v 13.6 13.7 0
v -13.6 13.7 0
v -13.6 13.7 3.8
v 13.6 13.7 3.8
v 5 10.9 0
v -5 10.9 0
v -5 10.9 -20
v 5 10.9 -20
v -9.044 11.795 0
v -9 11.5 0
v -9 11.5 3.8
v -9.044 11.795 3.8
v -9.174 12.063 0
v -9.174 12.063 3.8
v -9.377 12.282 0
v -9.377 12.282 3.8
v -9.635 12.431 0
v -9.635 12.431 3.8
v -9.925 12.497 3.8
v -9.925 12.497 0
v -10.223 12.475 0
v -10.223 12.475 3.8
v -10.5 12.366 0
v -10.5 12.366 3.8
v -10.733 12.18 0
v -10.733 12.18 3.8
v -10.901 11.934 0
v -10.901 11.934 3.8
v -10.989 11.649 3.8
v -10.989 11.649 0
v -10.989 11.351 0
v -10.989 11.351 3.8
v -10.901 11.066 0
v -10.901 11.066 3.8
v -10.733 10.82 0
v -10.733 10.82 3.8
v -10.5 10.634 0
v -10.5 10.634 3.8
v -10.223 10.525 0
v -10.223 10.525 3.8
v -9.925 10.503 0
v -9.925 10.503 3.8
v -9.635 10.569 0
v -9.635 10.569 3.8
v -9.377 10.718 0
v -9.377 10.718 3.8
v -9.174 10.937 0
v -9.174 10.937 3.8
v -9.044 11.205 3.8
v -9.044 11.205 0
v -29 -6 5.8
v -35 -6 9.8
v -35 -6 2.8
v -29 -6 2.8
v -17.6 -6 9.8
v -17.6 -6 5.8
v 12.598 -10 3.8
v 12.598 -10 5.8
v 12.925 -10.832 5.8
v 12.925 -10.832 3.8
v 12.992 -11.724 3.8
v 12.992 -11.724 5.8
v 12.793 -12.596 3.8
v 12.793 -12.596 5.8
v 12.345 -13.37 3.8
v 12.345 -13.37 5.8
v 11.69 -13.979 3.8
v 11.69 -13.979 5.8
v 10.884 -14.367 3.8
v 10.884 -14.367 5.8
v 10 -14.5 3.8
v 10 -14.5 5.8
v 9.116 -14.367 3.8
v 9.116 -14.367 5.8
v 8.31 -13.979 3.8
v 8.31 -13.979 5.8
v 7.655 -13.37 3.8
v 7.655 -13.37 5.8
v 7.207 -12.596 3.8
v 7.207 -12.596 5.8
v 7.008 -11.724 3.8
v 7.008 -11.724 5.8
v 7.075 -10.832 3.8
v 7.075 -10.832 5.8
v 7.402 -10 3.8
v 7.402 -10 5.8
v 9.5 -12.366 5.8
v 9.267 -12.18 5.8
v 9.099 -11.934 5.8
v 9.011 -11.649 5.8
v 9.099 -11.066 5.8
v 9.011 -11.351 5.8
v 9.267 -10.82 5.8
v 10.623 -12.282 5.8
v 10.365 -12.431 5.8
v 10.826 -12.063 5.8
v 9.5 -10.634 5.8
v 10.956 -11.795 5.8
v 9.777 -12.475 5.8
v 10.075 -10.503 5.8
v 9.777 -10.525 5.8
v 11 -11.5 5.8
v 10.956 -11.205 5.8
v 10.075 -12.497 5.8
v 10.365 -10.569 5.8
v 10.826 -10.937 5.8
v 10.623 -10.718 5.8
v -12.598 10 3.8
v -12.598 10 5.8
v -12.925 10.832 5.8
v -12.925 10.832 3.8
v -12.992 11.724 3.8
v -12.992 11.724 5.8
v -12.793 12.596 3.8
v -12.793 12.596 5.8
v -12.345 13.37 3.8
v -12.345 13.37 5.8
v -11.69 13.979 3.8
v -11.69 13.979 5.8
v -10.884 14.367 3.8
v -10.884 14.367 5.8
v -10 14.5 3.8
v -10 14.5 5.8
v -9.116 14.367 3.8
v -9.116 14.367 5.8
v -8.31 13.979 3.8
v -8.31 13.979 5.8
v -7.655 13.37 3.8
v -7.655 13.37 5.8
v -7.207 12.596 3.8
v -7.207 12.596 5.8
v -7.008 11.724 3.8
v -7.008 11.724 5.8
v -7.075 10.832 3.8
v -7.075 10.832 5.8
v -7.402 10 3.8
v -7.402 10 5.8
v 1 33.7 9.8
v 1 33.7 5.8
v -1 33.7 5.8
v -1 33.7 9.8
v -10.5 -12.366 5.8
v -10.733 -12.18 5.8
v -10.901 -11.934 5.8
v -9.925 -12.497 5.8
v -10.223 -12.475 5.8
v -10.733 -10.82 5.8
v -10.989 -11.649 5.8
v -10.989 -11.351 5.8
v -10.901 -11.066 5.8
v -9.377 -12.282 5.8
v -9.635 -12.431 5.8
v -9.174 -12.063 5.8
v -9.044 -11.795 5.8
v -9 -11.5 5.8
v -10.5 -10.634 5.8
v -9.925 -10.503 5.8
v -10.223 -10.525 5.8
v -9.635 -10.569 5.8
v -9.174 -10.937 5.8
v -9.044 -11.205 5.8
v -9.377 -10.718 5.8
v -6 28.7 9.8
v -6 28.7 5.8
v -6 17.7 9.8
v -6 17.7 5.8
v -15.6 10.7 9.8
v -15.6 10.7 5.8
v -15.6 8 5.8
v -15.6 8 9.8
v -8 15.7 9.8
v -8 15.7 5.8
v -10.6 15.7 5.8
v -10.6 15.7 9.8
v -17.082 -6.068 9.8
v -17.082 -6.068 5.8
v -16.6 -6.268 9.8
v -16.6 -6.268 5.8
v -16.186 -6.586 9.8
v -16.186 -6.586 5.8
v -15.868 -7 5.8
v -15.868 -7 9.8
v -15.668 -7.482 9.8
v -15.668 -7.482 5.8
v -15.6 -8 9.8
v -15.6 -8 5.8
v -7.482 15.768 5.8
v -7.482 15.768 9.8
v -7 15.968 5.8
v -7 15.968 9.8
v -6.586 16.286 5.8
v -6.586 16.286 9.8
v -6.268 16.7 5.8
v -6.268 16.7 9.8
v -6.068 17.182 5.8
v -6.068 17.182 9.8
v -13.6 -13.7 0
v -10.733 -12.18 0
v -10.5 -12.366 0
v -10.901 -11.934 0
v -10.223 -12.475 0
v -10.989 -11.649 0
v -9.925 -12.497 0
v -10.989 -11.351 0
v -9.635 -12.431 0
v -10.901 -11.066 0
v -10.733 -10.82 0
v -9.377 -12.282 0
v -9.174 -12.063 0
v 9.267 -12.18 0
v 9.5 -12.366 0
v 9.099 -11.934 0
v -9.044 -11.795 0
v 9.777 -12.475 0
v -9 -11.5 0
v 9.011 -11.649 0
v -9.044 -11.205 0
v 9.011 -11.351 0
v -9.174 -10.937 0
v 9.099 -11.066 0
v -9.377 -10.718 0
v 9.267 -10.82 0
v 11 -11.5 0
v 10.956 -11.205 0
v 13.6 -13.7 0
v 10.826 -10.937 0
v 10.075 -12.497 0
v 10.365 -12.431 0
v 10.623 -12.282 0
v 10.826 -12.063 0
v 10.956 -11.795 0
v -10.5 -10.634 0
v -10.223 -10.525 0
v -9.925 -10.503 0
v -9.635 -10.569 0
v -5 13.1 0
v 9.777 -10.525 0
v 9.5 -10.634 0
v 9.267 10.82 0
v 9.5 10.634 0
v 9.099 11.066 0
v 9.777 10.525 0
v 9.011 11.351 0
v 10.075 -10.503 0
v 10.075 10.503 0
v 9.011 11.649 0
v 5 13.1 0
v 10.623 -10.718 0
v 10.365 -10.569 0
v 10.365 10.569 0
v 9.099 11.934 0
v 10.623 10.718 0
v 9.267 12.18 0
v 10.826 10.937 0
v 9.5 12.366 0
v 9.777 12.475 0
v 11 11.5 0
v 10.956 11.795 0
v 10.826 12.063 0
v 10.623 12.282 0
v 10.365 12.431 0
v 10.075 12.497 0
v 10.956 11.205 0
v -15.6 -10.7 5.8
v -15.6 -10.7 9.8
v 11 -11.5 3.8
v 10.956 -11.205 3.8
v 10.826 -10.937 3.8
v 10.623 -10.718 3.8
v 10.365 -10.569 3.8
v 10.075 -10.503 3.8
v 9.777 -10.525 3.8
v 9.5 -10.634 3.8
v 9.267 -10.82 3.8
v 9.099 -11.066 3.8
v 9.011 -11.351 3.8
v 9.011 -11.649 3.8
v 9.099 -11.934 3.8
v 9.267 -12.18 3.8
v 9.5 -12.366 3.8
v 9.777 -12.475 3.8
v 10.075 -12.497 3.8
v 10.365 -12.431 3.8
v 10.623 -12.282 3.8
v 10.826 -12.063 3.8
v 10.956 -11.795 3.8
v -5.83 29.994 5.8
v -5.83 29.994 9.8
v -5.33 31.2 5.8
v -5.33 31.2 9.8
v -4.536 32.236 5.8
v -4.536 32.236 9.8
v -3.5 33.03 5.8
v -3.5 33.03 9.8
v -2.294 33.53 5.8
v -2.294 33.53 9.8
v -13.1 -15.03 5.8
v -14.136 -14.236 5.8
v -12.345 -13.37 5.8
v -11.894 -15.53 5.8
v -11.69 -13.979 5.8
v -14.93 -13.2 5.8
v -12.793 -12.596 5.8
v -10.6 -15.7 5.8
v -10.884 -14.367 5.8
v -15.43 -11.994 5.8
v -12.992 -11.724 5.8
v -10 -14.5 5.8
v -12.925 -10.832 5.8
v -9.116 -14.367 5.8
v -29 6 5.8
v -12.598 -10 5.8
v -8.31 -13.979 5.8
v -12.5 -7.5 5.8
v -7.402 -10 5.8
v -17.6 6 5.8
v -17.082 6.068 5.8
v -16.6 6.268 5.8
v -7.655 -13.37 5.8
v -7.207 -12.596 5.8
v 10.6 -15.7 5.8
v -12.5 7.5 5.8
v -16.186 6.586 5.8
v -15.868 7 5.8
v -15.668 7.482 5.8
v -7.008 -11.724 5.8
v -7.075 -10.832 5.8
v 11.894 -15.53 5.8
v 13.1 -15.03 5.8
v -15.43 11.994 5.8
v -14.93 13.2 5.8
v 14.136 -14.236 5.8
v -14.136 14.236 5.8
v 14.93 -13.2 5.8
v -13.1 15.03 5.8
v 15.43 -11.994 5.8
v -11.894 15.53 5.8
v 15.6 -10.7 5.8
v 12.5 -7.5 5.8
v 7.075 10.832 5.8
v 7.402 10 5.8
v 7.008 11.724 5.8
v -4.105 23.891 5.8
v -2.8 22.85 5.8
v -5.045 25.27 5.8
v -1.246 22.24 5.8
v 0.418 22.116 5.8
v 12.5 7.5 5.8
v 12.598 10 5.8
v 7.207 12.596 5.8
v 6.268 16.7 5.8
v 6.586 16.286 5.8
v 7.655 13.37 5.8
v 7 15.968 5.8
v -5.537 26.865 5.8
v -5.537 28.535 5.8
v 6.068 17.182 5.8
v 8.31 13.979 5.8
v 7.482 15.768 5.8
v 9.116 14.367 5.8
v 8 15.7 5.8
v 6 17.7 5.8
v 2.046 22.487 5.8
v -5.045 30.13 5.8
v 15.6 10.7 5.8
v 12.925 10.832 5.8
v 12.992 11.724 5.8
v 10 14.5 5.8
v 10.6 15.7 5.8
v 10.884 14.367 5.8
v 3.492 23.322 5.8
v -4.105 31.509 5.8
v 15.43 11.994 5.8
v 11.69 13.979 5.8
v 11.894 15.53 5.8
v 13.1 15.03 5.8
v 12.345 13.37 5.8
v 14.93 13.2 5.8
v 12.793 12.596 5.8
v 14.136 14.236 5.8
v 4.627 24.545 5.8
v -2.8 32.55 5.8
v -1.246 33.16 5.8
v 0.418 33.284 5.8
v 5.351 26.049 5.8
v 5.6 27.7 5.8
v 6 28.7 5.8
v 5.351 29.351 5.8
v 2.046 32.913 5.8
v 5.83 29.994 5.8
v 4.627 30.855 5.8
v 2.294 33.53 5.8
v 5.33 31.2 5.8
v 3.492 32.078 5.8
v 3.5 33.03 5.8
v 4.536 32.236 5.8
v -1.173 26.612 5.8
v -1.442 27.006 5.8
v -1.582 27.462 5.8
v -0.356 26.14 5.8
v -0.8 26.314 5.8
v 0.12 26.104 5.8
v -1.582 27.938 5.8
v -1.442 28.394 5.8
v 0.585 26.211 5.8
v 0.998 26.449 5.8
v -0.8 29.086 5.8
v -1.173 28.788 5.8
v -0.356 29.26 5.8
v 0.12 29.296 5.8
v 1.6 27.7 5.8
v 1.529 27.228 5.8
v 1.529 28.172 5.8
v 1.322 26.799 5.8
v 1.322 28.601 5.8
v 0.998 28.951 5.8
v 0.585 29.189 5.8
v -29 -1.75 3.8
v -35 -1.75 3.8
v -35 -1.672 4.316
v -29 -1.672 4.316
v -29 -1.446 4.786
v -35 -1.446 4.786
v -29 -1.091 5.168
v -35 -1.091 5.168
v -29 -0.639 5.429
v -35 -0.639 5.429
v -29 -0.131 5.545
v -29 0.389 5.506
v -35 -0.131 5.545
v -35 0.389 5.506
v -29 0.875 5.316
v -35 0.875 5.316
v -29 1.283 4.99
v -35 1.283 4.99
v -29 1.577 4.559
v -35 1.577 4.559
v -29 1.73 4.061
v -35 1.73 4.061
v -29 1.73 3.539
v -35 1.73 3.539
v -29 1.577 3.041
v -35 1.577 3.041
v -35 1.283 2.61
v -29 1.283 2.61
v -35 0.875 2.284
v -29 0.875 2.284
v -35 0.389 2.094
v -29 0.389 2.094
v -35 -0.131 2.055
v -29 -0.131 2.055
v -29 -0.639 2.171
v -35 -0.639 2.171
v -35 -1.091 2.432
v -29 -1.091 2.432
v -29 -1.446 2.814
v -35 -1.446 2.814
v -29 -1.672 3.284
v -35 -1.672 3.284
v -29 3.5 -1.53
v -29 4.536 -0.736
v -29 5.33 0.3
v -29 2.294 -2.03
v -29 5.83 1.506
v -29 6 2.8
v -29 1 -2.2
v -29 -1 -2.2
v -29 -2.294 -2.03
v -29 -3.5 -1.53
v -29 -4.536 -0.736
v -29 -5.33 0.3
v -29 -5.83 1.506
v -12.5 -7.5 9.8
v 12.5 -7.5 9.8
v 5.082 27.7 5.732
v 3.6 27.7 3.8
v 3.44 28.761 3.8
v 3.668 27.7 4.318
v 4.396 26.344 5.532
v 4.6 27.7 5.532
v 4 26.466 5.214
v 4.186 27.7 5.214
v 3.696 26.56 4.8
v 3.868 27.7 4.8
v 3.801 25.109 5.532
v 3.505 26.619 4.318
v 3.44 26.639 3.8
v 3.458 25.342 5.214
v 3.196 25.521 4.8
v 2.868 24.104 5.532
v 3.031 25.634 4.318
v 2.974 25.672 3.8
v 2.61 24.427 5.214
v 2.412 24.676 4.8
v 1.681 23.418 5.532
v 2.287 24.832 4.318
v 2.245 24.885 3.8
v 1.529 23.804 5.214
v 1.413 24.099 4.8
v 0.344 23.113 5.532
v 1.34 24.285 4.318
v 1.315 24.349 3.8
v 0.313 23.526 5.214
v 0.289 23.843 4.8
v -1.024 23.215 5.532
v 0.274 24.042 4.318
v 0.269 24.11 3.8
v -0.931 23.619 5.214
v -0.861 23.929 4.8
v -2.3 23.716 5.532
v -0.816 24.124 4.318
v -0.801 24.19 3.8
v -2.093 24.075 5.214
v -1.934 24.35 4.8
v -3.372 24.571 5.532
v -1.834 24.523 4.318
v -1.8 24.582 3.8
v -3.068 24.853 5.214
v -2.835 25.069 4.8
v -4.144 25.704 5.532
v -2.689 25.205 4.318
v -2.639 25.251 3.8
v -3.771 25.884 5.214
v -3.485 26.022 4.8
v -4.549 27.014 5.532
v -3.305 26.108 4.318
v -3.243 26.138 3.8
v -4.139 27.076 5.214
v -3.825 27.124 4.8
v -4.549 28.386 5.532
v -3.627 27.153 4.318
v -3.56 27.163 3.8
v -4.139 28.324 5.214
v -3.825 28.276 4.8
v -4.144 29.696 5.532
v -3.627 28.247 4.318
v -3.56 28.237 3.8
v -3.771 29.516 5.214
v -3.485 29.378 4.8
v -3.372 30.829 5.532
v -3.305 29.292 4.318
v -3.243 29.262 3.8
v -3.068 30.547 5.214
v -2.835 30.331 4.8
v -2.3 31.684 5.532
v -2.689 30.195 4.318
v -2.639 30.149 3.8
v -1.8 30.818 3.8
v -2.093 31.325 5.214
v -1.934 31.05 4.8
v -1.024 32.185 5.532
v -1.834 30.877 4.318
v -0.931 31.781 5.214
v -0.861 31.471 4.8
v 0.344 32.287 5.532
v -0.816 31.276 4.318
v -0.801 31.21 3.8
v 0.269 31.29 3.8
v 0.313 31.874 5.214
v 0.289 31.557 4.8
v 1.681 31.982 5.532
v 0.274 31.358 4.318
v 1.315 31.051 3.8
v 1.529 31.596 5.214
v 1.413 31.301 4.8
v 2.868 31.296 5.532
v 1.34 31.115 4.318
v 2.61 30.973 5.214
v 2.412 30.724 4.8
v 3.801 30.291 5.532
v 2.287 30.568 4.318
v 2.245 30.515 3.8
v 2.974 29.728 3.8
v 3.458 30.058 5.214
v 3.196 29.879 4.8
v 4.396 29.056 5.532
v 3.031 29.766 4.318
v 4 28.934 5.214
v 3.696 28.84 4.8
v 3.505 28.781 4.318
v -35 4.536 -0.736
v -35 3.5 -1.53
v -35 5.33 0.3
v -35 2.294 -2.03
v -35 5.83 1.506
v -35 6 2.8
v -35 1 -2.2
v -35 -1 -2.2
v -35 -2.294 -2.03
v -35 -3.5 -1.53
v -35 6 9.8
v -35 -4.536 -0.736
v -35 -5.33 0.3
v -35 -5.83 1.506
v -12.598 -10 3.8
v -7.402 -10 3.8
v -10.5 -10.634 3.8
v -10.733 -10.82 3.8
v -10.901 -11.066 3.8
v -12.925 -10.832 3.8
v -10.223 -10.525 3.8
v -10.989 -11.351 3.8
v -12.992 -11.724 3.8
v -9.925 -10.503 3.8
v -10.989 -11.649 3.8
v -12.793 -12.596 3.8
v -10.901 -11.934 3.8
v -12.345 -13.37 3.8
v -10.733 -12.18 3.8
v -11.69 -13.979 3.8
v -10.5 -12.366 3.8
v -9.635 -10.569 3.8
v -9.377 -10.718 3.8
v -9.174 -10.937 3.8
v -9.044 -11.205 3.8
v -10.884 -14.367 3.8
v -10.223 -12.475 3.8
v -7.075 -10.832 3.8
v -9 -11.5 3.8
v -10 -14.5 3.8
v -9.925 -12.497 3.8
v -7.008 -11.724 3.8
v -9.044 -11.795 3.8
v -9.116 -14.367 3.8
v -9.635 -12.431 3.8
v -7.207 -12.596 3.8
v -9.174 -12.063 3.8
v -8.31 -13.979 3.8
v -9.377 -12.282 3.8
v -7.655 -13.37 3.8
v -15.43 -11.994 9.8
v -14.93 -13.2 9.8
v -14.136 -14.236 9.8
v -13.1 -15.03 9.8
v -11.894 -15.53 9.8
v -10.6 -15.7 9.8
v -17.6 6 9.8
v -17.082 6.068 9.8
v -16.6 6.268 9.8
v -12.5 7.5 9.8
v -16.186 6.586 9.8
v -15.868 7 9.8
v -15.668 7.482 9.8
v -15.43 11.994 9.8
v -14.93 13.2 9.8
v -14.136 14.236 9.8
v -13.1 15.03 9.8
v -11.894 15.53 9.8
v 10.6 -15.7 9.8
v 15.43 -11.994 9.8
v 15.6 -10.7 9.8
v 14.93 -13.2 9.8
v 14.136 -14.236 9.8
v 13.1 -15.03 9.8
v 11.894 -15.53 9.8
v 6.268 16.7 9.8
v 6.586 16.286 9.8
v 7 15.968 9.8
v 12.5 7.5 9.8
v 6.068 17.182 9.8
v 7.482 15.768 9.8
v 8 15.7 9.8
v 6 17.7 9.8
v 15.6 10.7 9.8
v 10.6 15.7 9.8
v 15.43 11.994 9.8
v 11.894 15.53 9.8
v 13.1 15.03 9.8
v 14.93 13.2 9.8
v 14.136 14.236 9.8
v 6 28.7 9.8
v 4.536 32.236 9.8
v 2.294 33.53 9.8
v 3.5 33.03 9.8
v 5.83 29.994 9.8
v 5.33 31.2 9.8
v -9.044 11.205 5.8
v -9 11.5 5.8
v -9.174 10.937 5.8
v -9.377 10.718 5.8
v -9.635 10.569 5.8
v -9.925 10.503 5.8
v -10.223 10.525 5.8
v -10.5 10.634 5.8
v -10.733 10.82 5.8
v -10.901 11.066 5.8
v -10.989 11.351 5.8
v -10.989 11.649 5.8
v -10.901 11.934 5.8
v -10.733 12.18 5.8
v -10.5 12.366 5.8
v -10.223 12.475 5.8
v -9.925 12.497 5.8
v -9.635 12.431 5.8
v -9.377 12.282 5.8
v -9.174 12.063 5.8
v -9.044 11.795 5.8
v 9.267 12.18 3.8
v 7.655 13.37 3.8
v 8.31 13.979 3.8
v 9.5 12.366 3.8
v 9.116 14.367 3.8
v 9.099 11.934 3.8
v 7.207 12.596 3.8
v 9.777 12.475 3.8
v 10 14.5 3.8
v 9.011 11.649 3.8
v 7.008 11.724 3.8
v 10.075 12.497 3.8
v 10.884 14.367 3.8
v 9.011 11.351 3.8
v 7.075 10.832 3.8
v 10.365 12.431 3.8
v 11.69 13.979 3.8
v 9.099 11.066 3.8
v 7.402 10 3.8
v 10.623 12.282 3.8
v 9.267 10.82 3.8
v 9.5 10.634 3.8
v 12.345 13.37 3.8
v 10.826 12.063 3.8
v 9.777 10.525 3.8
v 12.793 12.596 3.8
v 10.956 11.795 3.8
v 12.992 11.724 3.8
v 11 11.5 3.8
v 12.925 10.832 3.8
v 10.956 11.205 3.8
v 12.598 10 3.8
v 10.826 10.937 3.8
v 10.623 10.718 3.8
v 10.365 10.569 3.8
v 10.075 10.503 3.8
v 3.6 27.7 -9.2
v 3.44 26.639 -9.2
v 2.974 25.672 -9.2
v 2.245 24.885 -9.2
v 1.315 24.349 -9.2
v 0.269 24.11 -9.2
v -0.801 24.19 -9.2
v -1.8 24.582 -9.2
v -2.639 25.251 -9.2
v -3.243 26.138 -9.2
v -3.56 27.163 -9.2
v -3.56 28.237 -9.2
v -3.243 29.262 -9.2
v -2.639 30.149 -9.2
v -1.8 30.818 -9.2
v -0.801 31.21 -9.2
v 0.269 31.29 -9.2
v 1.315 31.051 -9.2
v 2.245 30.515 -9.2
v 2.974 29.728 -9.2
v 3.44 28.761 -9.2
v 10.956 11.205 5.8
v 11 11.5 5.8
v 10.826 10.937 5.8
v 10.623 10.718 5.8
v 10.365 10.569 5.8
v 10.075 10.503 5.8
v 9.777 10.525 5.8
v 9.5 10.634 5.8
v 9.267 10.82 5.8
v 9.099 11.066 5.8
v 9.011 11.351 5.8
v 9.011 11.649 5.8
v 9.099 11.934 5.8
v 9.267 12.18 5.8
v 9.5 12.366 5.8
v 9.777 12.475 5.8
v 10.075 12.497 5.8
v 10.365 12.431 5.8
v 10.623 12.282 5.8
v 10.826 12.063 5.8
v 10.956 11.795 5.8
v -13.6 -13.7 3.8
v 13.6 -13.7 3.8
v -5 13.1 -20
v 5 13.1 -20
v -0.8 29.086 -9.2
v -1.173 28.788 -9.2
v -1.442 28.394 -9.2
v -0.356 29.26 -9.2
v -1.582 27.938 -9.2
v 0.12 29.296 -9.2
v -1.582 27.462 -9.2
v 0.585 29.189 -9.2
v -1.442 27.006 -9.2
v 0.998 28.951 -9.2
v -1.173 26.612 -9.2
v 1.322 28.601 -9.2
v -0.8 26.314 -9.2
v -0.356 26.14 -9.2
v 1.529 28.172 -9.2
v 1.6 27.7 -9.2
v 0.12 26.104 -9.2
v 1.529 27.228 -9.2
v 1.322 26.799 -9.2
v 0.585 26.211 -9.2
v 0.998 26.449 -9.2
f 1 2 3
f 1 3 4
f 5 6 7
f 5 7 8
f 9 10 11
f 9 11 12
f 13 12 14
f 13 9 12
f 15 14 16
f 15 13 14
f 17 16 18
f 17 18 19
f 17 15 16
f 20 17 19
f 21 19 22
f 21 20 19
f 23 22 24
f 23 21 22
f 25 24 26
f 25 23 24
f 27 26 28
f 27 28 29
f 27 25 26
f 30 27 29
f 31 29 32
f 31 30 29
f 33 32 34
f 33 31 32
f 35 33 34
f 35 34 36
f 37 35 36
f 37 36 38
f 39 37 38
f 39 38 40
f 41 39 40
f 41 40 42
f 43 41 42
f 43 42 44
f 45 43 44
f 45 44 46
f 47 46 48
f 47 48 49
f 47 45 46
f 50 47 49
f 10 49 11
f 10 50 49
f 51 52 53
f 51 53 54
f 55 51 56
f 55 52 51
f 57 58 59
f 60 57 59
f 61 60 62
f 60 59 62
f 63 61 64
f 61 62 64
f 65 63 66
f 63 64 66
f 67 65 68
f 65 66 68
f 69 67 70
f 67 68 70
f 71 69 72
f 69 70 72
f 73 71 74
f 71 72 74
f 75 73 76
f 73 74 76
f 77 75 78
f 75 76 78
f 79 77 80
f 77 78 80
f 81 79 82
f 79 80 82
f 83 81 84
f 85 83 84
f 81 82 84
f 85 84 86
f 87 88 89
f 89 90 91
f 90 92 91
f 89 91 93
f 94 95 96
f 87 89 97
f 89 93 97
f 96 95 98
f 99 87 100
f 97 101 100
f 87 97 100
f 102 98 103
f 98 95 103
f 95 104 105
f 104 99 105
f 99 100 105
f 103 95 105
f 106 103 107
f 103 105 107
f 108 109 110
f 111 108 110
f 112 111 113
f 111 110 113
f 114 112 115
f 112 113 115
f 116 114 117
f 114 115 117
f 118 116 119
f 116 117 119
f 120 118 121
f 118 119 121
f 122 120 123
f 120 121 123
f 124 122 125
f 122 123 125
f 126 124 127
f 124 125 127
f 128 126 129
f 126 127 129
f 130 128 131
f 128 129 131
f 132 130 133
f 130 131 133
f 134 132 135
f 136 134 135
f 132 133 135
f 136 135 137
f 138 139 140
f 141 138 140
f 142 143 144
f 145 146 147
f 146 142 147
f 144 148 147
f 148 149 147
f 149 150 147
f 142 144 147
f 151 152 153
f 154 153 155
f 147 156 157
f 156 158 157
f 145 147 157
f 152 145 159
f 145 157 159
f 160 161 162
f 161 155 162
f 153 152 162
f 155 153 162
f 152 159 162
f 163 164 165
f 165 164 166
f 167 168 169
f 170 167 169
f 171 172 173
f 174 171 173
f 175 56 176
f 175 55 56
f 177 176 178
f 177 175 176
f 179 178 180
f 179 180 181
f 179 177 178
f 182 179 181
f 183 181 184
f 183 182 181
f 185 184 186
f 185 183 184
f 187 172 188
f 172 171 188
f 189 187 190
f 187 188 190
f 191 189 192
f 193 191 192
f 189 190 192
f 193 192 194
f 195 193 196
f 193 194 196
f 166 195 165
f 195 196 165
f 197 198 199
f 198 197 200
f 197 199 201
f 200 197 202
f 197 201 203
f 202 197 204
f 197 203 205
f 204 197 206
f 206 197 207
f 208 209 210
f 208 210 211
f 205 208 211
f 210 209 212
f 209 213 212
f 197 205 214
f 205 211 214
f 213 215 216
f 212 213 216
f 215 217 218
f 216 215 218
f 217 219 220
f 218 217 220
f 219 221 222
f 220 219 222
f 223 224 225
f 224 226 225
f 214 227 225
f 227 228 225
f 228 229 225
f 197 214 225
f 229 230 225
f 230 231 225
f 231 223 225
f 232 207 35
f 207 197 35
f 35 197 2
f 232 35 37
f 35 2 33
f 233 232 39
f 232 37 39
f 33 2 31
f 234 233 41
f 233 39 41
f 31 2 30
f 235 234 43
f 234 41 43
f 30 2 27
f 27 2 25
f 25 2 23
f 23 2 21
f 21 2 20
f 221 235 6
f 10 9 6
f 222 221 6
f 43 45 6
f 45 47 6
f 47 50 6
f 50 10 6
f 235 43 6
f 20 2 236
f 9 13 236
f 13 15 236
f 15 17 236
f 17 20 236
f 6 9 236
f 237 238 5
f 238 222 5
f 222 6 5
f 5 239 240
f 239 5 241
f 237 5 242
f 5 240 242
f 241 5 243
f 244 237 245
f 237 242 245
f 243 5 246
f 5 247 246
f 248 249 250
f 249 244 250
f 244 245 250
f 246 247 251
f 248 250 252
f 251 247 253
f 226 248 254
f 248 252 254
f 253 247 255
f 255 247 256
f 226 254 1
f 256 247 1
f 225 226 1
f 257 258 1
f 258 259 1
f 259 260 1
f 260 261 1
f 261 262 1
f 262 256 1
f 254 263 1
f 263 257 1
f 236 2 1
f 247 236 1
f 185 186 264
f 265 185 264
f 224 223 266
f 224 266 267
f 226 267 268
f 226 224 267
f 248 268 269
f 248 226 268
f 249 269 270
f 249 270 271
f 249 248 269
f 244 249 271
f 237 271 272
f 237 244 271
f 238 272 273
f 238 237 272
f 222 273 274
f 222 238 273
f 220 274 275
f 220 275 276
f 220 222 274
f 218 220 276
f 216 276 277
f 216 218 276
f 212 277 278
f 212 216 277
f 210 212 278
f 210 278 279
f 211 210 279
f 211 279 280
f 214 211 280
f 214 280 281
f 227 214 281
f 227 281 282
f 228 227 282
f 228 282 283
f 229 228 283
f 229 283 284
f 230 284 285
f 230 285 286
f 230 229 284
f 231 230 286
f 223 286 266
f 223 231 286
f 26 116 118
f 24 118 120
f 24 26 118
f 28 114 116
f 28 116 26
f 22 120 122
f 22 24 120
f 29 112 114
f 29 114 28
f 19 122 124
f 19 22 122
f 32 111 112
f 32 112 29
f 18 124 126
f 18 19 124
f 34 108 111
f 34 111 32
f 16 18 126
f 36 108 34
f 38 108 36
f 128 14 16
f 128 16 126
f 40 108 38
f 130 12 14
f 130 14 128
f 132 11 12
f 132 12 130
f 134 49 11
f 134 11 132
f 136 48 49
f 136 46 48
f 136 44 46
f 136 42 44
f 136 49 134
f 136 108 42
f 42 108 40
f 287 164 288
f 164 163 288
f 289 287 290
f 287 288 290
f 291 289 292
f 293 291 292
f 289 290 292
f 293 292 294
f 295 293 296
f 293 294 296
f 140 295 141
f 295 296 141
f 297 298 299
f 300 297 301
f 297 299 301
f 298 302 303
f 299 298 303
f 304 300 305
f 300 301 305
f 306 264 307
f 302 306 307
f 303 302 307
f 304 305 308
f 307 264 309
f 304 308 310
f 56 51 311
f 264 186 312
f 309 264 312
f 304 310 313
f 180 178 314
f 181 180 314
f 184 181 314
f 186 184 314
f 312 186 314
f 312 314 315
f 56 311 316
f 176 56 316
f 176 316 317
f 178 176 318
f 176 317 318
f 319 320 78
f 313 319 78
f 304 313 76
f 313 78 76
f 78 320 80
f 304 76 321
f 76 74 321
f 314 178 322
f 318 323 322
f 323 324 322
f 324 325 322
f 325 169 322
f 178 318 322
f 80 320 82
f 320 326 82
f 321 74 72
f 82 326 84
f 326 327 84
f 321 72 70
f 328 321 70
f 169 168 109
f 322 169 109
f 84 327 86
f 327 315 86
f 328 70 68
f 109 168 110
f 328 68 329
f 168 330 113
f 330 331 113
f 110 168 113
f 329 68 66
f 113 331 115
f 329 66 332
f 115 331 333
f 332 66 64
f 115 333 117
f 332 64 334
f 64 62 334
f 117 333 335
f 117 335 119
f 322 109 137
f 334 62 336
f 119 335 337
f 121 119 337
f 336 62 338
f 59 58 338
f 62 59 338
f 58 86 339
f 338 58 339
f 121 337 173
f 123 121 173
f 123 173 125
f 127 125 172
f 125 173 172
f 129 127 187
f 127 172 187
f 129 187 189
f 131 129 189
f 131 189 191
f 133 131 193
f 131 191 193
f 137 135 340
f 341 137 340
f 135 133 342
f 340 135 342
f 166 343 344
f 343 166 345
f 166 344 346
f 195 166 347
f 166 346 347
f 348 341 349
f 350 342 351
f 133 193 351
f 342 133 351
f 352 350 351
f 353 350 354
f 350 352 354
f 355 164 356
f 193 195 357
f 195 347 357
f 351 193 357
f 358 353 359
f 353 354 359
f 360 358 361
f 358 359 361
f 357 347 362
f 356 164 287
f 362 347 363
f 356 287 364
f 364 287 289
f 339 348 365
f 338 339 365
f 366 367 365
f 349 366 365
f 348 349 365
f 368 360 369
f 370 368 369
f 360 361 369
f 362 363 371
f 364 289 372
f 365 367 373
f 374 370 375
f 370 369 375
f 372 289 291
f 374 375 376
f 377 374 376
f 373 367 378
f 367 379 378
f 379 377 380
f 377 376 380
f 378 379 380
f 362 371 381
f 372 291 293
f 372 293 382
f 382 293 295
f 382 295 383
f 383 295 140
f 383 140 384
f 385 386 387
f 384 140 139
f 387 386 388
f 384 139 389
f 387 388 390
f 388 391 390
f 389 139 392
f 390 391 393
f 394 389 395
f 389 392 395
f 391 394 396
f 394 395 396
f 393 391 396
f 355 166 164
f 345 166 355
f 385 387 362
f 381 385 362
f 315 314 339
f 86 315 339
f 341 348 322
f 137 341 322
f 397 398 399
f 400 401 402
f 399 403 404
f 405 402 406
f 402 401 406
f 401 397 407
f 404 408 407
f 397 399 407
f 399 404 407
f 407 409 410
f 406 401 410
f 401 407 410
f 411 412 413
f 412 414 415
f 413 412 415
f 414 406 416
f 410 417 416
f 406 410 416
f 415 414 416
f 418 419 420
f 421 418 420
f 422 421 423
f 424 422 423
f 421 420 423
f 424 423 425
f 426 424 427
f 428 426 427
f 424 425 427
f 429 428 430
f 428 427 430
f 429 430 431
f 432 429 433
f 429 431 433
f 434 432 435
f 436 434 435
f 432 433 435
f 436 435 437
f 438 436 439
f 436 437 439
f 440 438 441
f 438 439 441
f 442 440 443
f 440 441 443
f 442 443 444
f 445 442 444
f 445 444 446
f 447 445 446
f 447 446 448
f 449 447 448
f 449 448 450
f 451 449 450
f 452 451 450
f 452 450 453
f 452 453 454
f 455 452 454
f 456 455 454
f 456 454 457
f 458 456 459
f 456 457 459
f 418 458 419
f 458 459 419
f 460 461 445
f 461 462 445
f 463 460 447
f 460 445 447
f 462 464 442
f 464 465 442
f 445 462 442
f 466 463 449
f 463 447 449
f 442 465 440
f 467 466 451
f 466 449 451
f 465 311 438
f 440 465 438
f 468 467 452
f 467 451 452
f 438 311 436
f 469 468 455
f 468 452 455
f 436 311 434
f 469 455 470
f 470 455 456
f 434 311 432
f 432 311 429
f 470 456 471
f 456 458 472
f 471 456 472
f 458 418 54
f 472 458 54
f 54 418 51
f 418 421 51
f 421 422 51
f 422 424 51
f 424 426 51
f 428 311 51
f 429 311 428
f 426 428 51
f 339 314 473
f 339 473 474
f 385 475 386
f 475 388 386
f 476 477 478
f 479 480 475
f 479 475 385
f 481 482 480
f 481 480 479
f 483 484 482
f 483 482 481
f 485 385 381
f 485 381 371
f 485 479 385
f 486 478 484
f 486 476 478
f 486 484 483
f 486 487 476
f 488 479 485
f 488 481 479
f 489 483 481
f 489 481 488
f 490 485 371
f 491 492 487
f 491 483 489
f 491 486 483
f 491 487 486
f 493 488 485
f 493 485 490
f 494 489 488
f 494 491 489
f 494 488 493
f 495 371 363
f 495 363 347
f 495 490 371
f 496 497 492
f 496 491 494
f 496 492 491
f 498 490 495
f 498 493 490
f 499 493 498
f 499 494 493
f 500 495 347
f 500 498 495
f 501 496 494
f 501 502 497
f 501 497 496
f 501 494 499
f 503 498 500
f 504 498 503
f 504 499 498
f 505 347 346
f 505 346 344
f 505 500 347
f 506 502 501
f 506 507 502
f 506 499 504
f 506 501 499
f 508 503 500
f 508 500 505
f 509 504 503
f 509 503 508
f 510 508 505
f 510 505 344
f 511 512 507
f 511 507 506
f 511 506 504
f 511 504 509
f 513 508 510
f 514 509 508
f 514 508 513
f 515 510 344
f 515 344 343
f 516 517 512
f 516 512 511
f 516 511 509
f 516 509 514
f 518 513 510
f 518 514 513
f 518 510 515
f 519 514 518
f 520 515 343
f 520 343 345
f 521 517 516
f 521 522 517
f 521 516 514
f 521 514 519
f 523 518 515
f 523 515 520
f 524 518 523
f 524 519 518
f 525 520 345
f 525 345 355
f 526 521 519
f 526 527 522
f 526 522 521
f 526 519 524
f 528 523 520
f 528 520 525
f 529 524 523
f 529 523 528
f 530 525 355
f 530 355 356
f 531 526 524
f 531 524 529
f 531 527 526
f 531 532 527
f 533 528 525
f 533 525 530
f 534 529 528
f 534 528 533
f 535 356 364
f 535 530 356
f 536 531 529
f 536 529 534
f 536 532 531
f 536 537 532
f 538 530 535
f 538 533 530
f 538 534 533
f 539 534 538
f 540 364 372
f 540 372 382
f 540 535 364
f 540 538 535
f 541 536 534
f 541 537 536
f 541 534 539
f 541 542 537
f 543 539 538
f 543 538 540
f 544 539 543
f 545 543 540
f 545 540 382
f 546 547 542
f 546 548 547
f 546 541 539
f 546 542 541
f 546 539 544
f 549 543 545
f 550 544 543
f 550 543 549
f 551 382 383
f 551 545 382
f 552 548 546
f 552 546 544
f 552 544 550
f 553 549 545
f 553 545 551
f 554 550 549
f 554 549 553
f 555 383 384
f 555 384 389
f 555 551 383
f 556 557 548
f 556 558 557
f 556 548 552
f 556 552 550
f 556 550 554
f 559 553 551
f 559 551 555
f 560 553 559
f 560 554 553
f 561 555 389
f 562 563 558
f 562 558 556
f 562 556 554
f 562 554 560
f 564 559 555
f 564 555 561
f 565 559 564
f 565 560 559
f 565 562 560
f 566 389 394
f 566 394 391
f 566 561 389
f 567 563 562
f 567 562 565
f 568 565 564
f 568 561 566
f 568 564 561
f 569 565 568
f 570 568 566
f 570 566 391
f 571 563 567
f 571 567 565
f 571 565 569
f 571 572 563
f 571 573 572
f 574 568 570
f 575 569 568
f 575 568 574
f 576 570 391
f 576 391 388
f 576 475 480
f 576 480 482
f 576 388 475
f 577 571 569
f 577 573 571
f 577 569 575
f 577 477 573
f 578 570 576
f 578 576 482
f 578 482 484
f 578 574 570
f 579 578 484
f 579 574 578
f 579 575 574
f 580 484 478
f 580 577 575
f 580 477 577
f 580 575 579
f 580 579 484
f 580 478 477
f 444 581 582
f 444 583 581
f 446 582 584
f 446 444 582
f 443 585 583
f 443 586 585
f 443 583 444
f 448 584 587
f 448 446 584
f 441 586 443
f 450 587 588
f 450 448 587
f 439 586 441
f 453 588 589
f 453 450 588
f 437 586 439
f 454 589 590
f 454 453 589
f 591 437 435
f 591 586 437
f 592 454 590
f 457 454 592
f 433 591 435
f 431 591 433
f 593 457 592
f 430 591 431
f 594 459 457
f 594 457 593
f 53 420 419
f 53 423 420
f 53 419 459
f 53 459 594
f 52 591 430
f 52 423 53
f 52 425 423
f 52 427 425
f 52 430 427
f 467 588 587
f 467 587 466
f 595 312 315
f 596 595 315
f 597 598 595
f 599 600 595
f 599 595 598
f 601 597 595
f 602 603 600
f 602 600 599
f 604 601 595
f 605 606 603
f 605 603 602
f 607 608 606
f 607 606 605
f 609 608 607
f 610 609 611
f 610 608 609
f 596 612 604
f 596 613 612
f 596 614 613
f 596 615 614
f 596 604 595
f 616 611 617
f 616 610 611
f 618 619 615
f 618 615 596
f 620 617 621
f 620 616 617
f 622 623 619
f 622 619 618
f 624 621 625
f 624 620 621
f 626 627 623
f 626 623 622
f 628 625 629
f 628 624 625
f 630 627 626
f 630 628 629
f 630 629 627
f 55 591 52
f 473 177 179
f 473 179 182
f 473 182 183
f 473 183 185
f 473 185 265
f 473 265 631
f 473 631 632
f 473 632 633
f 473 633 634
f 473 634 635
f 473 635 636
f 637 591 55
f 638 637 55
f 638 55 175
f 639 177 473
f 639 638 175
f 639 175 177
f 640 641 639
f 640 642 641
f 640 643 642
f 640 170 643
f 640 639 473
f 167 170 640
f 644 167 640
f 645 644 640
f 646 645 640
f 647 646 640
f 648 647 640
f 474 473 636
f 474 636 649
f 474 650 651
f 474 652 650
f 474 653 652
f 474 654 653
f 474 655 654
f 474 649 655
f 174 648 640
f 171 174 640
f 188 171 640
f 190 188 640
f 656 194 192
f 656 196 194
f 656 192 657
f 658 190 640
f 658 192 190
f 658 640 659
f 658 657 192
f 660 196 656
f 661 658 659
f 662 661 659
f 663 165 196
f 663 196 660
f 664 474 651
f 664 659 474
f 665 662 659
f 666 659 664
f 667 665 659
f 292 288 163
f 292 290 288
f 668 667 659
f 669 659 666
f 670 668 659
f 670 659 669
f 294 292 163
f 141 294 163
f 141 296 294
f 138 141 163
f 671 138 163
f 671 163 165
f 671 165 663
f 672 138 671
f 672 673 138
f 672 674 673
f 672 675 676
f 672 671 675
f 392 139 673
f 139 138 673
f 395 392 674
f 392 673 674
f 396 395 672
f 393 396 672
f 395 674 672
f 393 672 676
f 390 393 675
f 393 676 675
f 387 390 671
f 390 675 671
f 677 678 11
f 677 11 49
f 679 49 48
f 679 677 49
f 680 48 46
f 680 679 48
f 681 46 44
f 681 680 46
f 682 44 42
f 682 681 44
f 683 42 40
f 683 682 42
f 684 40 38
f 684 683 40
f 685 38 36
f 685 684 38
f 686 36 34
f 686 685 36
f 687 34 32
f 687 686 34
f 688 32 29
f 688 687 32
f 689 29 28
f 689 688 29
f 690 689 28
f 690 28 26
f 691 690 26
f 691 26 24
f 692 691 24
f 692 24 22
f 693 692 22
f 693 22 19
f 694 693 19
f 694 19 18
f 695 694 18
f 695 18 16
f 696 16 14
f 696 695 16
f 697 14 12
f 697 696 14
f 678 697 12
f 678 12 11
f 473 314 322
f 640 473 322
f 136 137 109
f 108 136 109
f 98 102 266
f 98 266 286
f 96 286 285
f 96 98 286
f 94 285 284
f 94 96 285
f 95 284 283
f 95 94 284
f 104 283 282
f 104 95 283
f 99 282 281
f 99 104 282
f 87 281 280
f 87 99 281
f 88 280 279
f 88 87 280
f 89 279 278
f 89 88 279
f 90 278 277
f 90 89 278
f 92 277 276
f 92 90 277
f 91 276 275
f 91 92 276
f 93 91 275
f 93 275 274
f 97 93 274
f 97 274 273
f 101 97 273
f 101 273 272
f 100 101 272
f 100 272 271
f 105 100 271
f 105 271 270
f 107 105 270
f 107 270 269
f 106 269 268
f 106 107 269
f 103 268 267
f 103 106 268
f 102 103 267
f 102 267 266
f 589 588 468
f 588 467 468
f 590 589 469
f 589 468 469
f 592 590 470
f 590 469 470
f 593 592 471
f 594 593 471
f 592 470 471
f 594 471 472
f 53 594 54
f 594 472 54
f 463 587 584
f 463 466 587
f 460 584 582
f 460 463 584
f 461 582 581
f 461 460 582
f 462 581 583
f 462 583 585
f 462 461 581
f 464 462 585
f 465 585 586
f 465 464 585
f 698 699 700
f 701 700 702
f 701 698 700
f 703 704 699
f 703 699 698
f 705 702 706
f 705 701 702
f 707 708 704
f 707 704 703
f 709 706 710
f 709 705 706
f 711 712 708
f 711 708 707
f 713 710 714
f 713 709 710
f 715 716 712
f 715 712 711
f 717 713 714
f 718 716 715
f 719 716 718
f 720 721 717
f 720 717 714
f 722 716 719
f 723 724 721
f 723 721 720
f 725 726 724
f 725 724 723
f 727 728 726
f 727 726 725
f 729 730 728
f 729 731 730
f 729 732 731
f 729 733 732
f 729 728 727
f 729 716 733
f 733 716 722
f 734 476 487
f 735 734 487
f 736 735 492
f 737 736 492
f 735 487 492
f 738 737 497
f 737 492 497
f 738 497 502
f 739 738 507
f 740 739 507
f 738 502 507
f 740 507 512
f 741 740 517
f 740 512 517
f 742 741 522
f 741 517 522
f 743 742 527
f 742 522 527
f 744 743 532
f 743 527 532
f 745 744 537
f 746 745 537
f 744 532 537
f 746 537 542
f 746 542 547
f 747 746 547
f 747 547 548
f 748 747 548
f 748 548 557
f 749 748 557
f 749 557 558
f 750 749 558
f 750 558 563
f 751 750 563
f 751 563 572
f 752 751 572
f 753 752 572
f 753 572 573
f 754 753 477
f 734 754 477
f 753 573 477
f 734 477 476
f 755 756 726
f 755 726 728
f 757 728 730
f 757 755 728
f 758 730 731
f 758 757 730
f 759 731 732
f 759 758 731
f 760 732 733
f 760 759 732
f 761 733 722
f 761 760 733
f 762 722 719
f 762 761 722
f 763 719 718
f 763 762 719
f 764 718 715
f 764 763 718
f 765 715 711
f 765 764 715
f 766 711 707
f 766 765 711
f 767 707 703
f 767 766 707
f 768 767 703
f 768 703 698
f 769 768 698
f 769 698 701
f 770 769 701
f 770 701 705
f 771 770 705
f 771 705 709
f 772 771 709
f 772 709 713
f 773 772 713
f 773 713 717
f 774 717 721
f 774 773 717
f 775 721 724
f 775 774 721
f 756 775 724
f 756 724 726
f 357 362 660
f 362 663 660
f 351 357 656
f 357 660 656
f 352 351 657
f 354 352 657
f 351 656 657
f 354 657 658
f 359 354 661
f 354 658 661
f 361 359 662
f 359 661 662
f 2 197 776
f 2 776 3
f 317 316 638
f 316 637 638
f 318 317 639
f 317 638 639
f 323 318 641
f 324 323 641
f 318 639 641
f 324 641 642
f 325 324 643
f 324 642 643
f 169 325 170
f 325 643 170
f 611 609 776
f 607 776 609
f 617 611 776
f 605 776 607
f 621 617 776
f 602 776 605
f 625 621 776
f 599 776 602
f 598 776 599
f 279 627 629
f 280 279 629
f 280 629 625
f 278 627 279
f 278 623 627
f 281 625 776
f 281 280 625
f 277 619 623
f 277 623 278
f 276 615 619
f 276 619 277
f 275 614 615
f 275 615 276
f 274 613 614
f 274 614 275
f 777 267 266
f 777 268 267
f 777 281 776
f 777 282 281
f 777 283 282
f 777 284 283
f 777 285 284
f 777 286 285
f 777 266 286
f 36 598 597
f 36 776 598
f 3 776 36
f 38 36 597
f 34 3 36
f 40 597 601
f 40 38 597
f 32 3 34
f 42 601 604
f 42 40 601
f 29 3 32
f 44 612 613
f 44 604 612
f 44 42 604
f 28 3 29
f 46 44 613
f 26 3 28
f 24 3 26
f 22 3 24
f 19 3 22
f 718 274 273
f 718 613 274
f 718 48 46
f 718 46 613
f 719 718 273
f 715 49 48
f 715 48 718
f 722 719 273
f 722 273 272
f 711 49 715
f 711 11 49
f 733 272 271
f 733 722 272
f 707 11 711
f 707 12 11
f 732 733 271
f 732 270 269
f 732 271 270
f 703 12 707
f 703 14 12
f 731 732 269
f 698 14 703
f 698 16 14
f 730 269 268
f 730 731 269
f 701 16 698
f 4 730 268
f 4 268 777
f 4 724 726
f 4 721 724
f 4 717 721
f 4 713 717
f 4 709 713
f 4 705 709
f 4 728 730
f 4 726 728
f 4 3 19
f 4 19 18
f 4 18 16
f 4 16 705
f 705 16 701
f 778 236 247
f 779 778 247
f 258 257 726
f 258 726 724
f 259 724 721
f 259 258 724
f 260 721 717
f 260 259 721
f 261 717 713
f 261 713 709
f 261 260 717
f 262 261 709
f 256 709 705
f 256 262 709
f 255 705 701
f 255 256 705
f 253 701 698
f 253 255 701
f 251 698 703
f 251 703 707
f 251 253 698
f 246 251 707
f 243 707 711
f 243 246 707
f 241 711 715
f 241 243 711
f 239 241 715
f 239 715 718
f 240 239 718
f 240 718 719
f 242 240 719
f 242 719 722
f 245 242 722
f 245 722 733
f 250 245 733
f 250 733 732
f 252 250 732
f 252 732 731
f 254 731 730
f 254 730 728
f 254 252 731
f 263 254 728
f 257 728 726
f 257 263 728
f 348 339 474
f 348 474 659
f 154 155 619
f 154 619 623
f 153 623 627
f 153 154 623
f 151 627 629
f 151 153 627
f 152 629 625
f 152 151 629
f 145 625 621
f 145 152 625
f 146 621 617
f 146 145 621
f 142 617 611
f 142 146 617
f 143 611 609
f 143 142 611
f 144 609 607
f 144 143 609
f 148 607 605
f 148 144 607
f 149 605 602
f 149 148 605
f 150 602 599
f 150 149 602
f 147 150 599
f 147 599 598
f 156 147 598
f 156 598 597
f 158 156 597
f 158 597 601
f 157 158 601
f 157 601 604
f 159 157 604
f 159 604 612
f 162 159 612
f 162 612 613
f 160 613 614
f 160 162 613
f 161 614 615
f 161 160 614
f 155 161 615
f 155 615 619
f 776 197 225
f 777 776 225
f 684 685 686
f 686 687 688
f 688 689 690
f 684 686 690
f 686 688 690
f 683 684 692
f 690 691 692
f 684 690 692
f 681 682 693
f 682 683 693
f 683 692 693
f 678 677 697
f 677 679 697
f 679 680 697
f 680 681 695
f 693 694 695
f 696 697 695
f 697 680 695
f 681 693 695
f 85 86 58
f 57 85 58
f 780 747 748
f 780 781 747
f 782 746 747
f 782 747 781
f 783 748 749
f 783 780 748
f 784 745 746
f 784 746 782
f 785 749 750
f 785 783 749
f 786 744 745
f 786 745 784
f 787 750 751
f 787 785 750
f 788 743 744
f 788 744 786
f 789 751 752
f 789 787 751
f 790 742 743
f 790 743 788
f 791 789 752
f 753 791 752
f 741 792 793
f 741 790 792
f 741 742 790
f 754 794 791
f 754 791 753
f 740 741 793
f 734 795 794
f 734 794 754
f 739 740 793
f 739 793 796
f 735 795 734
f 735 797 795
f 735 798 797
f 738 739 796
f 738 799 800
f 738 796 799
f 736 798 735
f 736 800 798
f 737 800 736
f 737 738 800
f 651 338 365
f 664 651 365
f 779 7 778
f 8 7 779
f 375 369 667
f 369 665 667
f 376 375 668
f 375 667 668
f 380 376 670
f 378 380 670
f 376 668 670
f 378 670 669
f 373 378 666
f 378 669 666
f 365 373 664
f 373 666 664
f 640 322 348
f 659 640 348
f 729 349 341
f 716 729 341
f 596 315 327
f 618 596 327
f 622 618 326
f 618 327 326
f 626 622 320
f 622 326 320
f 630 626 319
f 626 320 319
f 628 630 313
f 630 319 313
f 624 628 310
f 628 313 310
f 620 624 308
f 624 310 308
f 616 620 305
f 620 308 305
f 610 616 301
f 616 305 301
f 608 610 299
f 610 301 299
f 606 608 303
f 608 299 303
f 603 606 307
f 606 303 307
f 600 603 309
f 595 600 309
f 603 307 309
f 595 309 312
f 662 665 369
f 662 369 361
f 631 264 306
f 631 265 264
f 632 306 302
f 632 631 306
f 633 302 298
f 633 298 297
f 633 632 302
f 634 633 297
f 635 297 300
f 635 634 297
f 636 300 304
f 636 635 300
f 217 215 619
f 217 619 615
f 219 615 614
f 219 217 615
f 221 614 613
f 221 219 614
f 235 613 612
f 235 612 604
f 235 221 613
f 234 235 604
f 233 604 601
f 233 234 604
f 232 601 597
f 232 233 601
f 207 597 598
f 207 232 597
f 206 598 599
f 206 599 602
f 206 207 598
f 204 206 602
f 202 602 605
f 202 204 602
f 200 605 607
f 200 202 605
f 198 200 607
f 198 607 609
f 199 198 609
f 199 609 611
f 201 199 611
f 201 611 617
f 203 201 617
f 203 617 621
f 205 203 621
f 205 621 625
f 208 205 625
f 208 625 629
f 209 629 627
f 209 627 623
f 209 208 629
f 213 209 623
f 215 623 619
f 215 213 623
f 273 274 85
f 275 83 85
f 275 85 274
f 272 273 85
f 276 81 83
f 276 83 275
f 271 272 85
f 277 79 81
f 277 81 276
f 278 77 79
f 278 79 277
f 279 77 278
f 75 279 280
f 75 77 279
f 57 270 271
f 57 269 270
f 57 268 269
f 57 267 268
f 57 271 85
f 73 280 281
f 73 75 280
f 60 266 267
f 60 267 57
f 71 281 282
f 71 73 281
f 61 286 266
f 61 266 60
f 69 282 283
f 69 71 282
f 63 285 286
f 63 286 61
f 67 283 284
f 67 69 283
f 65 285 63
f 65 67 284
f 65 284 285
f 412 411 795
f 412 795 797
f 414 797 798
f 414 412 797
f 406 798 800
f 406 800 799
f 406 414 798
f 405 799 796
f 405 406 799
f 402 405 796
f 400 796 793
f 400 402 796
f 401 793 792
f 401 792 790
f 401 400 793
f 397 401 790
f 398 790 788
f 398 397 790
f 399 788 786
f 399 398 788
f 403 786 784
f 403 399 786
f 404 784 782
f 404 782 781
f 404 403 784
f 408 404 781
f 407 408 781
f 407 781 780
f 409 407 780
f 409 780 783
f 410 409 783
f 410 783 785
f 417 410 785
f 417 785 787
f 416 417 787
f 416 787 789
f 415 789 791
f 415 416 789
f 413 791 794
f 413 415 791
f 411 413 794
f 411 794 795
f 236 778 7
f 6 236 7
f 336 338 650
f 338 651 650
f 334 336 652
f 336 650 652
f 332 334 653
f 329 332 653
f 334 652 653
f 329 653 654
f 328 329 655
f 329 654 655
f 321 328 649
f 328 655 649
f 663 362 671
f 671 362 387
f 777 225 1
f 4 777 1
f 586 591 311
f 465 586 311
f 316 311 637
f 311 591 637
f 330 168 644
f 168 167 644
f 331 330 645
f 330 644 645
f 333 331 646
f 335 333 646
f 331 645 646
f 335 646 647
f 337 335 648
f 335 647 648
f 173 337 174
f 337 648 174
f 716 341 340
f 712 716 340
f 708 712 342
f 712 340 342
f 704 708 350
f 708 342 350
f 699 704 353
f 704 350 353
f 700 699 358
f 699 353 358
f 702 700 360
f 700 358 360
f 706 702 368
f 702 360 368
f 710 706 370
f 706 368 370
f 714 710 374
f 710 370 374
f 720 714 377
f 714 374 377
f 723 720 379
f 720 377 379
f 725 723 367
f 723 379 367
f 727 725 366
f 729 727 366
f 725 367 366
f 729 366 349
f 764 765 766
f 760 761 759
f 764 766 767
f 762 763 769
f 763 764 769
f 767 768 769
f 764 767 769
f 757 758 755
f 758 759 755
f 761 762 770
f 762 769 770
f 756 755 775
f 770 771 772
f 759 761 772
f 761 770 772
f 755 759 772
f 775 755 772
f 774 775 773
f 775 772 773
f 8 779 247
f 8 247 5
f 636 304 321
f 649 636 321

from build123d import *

# Parameters (mm, degrees)
F2_W      = 27.2
F2_H      = 27.4
F2_R      = 1
F3_DEPTH  = 3.8
F4_W      = 10
F4_H      = 2.2
F5_DEPTH  = 20
F7_W      = 25
F7_H      = 15
F8_DEPTH  = 4
F9_R      = 3.6
F9_R_2    = 1.6
F10_DEPTH = 15
F11_R     = 1
F12_DEPTH = 2
F13_W     = 6
F13_H     = 12
F14_DEPTH = 8
F15_R     = 1.75
F16_DEPTH = 6
F17_R     = 5
F18_R     = 2


with BuildPart() as f3:
    # F2 (on Top) → F3 (new body)
    with BuildSketch(Plane.XY):
        Rectangle(F2_W, F2_H)
        with Locations((-10, -11.5)):
            Circle(F2_R, mode=Mode.SUBTRACT)
        with Locations((10, -11.5)):
            Circle(F2_R, mode=Mode.SUBTRACT)
        with Locations((-10, 11.5)):
            Circle(F2_R, mode=Mode.SUBTRACT)
        with Locations((10, 11.5)):
            Circle(F2_R, mode=Mode.SUBTRACT)
    extrude(amount=F3_DEPTH)

    # F4 (on face) → F5 (join)
    with BuildSketch(Plane(origin=(0, 0, 0), x_dir=(1, 0, 0), z_dir=(0, 0, -1))):
        with Locations((0, -12)):
            Rectangle(F4_W, F4_H)
    extrude(amount=F5_DEPTH)


with BuildPart() as f8:
    # F7 (on offset) → F8 (new body)
    with BuildSketch(Plane.XY.offset(5.8)):
        Polygon((-6, 15.7), (-15.6, 15.7), (-15.6, 6), (-35, 6), (-35, -6), (-15.6, -6), (-15.6, -15.7), (15.6, -15.7), (15.6, 15.7), (6, 15.7), (6, 33.7), (-6, 33.7), align=None)
        Rectangle(F7_W, F7_H, mode=Mode.SUBTRACT)
    extrude(amount=F8_DEPTH)

    # F9 (on face) → F10 (join)
    with BuildSketch(Plane(origin=(0, 0, 5.8), x_dir=(1, 0, 0), z_dir=(0, 0, -1))):
        with Locations((0, -27.7)):
            Circle(F9_R)
        with Locations((0, -27.7)):
            Circle(F9_R_2, mode=Mode.SUBTRACT)
    extrude(amount=F10_DEPTH)

    # F11 (on face) → F12 (join, through all)
    with BuildSketch(Plane(origin=(0, 0, 5.8), x_dir=(1, 0, 0), z_dir=(0, 0, -1))):
        with BuildLine():
            Line((-12.5980762114, 10), (-7.4019237886, 10))
            ThreePointArc((-7.4019237886, 10), (-10, 14.5), (-12.5980762114, 10))
        make_face()
        with Locations((-10, 11.5)):
            Circle(F11_R, mode=Mode.SUBTRACT)
        with BuildLine():
            Line((-7.4019237886, -10), (-12.5980762114, -10))
            ThreePointArc((-12.5980762114, -10), (-10, -14.5), (-7.4019237886, -10))
        make_face()
        with Locations((-10, -11.5)):
            Circle(F11_R, mode=Mode.SUBTRACT)
        with BuildLine():
            Line((12.5980762114, -10), (7.4019237886, -10))
            ThreePointArc((7.4019237886, -10), (10, -14.5), (12.5980762114, -10))
        make_face()
        with Locations((10, -11.5)):
            Circle(F11_R, mode=Mode.SUBTRACT)
        with BuildLine():
            Line((7.4019237886, 10), (12.5980762114, 10))
            ThreePointArc((12.5980762114, 10), (10, 14.5), (7.4019237886, 10))
        make_face()
        with Locations((10, 11.5)):
            Circle(F11_R, mode=Mode.SUBTRACT)
    extrude(amount=F12_DEPTH)

    # F13 (on face) → F14 (join)
    with BuildSketch(Plane(origin=(0, 0, 5.8), x_dir=(1, 0, 0), z_dir=(0, 0, -1))):
        with Locations((-32, 0)):
            Rectangle(F13_W, F13_H)
    extrude(amount=F14_DEPTH)

    # F15 (on face) → F16 (cut, through all)
    with BuildSketch(Plane(origin=(-35, 0, 0), x_dir=(0, -1, 0), z_dir=(-1, 0, 0))):
        with Locations((0, 3.8)):
            Circle(F15_R)
    extrude(amount=-F16_DEPTH, mode=Mode.SUBTRACT)

    # F17
    f17_edges = [f8.edges().sort_by_distance(p)[0] for p in [
        (-15.6, 15.7, 7.8),
        (-15.6, -15.7, 7.8),
        (15.6, -15.7, 7.8),
        (-6, 33.7, 7.8),
        (6, 33.7, 7.8),
        (15.6, 15.7, 7.8),
        (-32, 6, -2.2),
        (-32, -6, -2.2),
    ]]
    fillet(f17_edges, radius=F17_R)

    # F18
    f18_edges = [f8.edges().sort_by_distance(p)[0] for p in [
        (-6, 15.7, 7.8),
        (6, 15.7, 7.8),
        (-15.6, -6, 7.8),
        (-15.6, 6, 7.8),
        (-3.6, 27.7, 5.8),
    ]]
    fillet(f18_edges, radius=F18_R)


solid = Compound([f3.part, f8.part])
